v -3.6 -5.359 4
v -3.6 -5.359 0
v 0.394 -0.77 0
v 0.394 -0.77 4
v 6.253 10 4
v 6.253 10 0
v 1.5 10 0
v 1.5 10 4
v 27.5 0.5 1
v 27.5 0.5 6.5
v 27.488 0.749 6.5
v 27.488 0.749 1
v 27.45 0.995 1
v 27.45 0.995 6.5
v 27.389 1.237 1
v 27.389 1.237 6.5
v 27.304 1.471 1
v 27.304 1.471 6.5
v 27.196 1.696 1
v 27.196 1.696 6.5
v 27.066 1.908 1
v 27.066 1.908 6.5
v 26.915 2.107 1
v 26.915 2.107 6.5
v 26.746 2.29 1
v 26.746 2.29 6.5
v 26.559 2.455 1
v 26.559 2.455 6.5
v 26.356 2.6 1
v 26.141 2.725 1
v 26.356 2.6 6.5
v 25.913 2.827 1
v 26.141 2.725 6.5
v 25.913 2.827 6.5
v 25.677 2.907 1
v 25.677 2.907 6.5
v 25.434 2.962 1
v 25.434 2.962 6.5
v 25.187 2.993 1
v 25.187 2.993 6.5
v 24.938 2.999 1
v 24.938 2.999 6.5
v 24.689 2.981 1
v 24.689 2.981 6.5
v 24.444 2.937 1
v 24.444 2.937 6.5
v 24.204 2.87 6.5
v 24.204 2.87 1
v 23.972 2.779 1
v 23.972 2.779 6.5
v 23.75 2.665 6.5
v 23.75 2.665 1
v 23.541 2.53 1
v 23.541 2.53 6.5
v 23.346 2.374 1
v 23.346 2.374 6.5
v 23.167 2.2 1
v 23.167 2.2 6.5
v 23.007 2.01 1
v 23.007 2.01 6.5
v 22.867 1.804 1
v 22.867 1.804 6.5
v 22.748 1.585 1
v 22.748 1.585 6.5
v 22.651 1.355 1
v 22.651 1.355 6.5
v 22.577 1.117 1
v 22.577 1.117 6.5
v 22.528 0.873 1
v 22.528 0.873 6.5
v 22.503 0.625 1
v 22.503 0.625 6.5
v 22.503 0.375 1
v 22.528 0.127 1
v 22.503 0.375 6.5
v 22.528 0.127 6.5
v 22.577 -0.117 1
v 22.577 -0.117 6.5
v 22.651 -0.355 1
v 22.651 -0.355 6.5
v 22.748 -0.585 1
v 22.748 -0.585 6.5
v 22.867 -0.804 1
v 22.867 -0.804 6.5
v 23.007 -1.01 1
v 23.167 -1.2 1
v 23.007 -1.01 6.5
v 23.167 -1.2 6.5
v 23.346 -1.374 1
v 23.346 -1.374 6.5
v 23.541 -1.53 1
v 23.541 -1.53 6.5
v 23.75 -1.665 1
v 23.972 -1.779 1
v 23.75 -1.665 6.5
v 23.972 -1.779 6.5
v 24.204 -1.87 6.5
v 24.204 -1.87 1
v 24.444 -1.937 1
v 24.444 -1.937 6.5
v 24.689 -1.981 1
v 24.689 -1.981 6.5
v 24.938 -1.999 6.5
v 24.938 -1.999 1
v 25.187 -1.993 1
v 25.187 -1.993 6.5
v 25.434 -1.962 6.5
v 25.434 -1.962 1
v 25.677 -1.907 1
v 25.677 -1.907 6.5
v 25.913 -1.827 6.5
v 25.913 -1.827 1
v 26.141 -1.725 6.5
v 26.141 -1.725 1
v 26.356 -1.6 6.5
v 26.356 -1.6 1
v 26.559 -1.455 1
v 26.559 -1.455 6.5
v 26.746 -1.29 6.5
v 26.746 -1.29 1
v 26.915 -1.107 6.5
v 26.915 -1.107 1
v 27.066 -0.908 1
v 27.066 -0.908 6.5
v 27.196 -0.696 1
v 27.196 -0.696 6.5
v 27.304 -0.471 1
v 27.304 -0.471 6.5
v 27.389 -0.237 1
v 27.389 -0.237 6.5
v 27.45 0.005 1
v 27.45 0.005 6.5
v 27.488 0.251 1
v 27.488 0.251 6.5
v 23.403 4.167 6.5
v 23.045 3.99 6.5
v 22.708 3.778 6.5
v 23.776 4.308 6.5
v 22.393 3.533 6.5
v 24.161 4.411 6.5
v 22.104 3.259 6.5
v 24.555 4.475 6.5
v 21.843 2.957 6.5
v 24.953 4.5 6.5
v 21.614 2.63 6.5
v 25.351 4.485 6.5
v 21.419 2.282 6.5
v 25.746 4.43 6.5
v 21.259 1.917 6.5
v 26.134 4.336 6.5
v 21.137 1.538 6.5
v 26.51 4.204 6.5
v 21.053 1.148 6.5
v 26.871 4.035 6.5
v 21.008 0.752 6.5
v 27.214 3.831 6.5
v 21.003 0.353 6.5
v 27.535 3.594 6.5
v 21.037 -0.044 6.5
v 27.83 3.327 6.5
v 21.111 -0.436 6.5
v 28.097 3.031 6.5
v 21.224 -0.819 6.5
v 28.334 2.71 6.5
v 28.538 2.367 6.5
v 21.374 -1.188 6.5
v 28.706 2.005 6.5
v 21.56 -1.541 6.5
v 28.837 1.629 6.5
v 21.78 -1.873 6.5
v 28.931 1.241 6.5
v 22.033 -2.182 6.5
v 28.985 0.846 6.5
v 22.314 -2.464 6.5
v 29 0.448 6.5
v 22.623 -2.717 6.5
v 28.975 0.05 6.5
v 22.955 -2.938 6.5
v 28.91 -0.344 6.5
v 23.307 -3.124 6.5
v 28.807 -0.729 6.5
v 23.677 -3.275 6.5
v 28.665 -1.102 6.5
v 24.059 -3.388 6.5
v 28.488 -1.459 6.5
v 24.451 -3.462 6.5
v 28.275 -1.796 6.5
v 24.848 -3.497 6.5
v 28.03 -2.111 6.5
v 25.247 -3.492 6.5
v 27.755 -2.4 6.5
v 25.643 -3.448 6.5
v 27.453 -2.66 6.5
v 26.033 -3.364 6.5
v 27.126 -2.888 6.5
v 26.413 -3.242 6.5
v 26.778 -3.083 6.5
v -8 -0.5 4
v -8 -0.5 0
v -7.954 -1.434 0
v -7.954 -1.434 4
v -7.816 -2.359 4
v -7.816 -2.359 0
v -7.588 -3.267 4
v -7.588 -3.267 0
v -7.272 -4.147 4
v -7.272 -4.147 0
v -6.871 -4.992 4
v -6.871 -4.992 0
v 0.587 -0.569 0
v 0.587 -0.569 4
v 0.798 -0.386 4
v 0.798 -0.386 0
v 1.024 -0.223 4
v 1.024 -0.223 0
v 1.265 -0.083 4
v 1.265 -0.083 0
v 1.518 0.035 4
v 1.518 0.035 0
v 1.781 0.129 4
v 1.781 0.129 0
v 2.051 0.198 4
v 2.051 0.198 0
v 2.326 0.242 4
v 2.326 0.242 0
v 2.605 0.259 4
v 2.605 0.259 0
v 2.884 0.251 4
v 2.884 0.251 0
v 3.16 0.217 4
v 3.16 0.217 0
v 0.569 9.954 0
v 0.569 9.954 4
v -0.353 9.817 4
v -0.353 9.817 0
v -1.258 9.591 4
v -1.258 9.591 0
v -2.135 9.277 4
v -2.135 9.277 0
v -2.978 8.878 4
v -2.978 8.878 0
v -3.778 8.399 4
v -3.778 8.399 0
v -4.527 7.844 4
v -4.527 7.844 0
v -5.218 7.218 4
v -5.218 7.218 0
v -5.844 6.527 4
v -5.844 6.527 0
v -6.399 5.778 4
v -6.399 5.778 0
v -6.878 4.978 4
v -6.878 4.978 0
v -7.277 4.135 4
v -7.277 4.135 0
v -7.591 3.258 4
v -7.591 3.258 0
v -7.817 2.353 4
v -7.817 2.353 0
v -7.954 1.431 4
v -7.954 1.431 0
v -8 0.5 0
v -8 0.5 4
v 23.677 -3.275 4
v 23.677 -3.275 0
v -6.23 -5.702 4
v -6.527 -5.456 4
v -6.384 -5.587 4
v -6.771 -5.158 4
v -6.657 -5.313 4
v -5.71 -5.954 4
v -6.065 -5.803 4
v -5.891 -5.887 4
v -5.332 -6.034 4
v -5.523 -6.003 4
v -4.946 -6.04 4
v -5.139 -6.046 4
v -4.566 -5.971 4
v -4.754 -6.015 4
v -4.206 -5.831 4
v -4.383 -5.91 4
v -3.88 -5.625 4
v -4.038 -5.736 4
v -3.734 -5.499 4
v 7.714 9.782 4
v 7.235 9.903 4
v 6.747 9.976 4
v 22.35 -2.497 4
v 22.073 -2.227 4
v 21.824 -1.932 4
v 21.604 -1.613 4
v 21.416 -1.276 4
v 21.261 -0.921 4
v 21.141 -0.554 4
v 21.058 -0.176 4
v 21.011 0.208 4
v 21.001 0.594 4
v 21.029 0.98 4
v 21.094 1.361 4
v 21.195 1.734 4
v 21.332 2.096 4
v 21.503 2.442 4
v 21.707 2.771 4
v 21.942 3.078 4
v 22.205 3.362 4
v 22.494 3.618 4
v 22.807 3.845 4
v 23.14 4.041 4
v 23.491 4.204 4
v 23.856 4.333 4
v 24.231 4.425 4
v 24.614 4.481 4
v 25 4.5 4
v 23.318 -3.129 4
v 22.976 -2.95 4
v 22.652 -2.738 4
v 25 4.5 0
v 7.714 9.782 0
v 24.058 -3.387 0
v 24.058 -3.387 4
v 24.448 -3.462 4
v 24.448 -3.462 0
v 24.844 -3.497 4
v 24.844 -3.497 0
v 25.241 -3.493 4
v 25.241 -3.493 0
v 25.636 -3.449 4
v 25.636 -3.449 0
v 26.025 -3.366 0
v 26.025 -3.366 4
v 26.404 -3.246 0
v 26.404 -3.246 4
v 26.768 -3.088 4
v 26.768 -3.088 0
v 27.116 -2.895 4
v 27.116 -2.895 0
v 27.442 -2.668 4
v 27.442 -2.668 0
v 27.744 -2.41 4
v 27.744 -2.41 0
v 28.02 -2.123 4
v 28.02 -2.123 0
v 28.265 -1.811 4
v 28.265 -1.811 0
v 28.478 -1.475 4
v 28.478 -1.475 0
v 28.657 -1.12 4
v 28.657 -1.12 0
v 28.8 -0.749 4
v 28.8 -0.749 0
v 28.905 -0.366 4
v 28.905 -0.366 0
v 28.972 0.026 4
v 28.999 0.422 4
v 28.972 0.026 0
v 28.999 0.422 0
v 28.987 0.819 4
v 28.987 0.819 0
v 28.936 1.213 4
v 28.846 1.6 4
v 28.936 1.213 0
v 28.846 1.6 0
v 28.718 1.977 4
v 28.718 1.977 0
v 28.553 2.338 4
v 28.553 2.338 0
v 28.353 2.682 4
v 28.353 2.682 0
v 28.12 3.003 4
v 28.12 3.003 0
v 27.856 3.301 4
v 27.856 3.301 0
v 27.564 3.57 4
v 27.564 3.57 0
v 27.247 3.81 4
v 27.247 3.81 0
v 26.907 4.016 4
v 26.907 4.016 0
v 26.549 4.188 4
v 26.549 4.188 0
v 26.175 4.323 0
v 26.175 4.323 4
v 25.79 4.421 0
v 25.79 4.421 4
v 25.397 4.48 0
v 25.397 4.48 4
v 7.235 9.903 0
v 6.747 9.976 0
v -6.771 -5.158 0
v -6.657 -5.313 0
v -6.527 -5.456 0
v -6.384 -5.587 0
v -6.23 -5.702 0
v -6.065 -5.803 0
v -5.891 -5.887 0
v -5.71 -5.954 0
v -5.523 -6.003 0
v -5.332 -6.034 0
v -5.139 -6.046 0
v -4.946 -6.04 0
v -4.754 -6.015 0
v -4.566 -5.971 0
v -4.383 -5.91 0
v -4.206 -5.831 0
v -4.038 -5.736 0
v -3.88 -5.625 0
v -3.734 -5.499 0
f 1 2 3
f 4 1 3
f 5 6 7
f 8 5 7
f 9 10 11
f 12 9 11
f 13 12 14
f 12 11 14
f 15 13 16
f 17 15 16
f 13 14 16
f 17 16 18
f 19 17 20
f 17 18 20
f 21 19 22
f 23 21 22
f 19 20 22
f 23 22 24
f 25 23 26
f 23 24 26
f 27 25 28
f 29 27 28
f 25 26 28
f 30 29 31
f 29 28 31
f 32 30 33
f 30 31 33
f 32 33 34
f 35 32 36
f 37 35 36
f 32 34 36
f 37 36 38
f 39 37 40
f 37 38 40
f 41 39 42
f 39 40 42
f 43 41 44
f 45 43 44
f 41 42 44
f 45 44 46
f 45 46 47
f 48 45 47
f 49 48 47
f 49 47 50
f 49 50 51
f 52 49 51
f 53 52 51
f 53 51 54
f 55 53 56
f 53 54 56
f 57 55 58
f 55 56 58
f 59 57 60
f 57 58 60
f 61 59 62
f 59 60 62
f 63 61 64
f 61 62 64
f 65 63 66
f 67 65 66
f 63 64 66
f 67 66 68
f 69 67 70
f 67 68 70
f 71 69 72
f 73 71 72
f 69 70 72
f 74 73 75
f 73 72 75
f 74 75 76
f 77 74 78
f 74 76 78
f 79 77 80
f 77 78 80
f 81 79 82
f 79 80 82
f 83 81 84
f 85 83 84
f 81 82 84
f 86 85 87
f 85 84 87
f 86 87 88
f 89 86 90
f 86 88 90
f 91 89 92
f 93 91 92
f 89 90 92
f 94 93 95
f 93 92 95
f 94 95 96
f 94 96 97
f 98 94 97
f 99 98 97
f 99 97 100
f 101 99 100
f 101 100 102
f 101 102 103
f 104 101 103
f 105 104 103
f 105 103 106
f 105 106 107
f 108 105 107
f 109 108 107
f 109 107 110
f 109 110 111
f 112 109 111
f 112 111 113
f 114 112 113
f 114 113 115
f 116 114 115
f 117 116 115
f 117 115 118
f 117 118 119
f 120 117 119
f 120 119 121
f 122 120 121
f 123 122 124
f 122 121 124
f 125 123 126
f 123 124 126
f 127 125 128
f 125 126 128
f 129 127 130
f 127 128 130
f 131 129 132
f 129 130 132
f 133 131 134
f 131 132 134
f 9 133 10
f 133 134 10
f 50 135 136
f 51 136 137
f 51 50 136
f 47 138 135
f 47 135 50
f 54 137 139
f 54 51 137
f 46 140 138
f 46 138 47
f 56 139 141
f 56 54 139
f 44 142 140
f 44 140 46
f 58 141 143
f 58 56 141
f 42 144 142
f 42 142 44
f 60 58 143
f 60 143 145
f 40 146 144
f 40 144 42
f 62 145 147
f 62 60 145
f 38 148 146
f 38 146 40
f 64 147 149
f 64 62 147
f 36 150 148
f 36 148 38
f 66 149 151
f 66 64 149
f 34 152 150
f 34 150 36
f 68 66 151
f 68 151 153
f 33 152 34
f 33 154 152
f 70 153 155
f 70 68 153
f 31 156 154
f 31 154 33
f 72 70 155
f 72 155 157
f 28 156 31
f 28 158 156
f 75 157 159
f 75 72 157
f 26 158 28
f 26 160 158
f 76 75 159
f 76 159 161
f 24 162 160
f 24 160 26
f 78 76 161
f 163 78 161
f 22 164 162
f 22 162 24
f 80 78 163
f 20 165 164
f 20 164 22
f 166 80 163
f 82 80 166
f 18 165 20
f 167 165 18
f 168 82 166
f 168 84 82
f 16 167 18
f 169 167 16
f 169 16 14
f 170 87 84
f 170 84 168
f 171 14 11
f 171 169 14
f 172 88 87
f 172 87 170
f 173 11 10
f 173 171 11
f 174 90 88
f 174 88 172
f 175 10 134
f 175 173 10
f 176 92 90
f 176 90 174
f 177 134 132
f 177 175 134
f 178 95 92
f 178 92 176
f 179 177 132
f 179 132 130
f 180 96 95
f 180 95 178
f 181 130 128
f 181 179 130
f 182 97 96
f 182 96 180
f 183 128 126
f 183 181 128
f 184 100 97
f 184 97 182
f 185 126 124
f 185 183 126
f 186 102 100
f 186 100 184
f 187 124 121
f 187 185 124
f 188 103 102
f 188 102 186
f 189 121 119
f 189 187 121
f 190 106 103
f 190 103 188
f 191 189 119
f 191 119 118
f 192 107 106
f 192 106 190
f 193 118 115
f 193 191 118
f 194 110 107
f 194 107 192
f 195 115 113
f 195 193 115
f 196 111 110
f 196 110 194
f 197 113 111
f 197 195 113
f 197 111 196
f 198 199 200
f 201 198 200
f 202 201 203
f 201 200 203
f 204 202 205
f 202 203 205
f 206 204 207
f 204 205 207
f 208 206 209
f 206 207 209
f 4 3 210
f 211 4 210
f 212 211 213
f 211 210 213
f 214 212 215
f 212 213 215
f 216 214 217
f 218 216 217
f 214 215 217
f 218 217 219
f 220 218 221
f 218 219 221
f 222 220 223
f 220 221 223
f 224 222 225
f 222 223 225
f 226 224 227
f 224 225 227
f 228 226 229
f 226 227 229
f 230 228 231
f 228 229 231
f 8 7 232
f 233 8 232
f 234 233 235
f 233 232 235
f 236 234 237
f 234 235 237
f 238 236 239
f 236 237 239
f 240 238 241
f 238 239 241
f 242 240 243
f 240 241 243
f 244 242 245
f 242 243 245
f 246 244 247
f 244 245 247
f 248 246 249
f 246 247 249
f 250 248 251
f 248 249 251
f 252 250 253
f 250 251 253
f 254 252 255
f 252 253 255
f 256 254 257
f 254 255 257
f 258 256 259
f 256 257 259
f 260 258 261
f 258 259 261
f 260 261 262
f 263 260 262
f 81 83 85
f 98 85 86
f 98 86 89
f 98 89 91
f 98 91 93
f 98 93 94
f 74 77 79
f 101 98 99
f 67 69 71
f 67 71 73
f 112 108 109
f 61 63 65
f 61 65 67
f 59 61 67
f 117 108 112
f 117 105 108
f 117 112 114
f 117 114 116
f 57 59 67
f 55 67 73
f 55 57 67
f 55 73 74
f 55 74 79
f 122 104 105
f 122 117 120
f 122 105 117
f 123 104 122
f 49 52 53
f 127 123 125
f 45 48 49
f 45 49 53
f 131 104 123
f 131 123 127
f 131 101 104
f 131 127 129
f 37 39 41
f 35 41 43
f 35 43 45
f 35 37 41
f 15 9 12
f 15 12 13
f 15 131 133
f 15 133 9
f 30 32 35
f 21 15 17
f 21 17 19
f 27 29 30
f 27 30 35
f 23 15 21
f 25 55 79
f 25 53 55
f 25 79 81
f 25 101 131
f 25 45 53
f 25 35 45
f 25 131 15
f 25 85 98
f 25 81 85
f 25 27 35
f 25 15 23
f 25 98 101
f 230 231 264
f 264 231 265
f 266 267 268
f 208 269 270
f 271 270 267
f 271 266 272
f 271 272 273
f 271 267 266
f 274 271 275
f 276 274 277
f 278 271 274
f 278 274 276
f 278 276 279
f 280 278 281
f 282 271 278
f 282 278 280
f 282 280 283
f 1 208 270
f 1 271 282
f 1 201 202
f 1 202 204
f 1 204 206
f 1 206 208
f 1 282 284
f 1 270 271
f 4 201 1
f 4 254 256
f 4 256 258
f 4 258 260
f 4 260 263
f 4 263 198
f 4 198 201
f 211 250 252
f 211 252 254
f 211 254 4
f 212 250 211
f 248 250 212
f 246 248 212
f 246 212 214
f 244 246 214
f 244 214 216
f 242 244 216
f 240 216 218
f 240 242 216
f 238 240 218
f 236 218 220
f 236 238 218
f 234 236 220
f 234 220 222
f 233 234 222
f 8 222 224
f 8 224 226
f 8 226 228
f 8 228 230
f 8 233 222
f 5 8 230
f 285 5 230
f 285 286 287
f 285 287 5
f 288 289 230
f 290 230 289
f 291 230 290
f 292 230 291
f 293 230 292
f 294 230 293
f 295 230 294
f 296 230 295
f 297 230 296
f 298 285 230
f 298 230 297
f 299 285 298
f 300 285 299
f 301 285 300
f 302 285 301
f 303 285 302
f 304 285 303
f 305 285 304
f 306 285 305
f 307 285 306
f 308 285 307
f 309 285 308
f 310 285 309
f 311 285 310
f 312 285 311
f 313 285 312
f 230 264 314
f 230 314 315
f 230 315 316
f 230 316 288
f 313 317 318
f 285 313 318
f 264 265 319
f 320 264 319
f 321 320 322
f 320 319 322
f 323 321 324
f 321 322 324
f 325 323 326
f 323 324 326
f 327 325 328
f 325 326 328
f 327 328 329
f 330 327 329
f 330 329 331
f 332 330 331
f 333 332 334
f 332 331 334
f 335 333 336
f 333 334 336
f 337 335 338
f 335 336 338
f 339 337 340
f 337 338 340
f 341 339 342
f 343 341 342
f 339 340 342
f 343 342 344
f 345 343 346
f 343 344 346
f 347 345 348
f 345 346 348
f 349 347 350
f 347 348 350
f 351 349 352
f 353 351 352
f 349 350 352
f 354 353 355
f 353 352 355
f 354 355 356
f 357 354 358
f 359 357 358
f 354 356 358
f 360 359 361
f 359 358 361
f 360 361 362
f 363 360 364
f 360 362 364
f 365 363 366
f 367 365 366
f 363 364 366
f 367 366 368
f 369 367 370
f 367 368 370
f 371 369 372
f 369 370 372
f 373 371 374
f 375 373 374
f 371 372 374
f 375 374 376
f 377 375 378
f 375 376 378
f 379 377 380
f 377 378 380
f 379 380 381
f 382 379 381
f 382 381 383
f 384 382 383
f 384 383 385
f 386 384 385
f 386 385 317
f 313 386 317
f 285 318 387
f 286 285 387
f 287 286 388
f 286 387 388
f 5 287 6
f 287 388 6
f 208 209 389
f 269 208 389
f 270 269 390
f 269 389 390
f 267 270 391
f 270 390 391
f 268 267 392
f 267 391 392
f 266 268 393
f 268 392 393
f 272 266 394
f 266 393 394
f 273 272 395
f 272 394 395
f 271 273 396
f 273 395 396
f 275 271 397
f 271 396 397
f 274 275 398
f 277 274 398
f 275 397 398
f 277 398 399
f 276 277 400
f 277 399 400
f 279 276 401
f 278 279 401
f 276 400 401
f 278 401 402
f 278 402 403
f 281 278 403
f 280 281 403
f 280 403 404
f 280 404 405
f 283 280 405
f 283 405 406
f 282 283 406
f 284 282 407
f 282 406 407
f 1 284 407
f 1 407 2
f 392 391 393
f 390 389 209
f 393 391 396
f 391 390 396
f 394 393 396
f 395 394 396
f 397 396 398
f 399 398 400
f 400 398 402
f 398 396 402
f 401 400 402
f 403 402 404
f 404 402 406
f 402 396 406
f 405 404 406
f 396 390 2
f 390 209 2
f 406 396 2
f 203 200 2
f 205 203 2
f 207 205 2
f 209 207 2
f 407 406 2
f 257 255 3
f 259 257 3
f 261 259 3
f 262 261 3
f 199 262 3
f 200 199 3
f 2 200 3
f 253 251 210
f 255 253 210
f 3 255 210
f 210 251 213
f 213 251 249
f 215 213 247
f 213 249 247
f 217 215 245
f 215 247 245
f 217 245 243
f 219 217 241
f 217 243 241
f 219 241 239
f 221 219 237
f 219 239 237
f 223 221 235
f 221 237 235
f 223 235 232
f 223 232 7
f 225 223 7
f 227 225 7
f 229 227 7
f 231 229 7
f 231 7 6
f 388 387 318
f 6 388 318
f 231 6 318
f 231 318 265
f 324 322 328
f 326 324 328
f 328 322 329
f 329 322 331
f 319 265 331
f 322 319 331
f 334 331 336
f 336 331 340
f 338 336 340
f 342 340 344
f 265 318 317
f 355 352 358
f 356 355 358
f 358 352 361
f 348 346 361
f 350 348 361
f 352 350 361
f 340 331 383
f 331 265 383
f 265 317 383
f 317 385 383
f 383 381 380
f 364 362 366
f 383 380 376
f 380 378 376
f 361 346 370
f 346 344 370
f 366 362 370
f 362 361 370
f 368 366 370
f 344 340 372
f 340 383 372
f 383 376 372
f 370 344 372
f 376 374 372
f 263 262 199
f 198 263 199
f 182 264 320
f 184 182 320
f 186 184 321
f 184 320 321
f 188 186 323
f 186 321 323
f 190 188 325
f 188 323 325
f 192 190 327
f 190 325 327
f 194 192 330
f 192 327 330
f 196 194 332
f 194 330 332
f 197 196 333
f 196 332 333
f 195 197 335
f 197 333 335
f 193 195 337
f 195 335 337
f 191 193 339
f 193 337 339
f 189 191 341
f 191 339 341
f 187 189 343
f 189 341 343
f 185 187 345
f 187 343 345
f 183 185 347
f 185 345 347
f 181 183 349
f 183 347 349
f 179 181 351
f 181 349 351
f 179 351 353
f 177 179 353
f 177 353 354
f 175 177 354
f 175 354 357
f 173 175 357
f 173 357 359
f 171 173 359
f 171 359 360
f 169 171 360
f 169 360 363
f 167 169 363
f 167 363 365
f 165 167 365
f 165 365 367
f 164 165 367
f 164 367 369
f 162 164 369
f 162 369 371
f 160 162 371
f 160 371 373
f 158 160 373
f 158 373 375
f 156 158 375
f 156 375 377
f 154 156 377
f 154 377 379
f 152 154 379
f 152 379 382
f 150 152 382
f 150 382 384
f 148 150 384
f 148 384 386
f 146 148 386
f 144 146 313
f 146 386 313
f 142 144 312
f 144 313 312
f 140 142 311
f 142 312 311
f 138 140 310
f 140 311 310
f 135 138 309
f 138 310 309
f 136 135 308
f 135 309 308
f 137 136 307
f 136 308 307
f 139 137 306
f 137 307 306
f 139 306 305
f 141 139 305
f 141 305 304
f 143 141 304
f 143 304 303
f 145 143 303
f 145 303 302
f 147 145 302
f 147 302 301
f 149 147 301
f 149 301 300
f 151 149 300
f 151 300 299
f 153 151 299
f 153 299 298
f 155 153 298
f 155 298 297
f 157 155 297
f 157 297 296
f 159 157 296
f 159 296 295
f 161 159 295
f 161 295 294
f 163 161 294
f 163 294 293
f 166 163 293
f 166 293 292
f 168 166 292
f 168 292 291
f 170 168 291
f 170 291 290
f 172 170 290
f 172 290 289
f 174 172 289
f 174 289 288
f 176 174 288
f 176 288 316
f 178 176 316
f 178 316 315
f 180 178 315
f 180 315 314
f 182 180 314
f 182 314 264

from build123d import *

# Parameters (mm, degrees)
ESBO_O1_R                = 4
RESSALTO_EXTRUS_O1_DEPTH = 4
ESBO_O3_R                = 4
RESSALTO_EXTRUS_O2_DEPTH = 2.5
ESBO_O5_R                = 2.5
CORTE_EXTRUS_O1_DEPTH    = 5.5


with BuildPart() as part:
    # Esboço1 → Ressalto-extrusão1 (new body)
    with BuildSketch(Plane.XY):
        with Locations((25, 0.5)):
            Circle(ESBO_O1_R)
        with BuildLine():
            ThreePointArc((0.394172842, -0.77044566), (1.648131789, 0.085177798), (3.16042427, 0.217374592))
            Line((3.16042427, 0.217374592), (23.676638803, -3.27474703))
            ThreePointArc((23.676638803, -3.27474703), (21.056715321, 1.171197392), (25, 4.5))
            Line((25, 4.5), (7.714247019, 9.781757855))
            ThreePointArc((7.714247019, 9.781757855), (6.991805383, 9.945138485), (6.253154341, 10))
            Line((6.253154341, 10), (1.5, 10))
            ThreePointArc((1.5, 10), (-5.217514421, 7.217514421), (-8, 0.5))
            Line((-8, 0.5), (-8, -0.5))
            ThreePointArc((-8, -0.5), (-7.713418989, -2.815795873), (-6.870966205, -4.991873194))
            ThreePointArc((-6.870966205, -4.991873194), (-5.331925608, -6.033714451), (-3.600088608, -5.359311184))
            Line((-3.600088608, -5.359311184), (0.394172842, -0.77044566))
        make_face()
    extrude(amount=RESSALTO_EXTRUS_O1_DEPTH)

    # Esboço3 → Ressalto-extrusão2 (add)
    with BuildSketch(Plane.XY.offset(4)):
        with Locations(Location((25, 0.5, 0), (0, 0, 250.680213843))):
            Circle(ESBO_O3_R)
    extrude(amount=RESSALTO_EXTRUS_O2_DEPTH)

    # Esboço5 → Corte-extrusão1 (cut)
    with BuildSketch(Plane.XY.offset(6.5)):
        with Locations((25, 0.5)):
            Circle(ESBO_O5_R)
    extrude(amount=-CORTE_EXTRUS_O1_DEPTH, mode=Mode.SUBTRACT)


solid = part.part
